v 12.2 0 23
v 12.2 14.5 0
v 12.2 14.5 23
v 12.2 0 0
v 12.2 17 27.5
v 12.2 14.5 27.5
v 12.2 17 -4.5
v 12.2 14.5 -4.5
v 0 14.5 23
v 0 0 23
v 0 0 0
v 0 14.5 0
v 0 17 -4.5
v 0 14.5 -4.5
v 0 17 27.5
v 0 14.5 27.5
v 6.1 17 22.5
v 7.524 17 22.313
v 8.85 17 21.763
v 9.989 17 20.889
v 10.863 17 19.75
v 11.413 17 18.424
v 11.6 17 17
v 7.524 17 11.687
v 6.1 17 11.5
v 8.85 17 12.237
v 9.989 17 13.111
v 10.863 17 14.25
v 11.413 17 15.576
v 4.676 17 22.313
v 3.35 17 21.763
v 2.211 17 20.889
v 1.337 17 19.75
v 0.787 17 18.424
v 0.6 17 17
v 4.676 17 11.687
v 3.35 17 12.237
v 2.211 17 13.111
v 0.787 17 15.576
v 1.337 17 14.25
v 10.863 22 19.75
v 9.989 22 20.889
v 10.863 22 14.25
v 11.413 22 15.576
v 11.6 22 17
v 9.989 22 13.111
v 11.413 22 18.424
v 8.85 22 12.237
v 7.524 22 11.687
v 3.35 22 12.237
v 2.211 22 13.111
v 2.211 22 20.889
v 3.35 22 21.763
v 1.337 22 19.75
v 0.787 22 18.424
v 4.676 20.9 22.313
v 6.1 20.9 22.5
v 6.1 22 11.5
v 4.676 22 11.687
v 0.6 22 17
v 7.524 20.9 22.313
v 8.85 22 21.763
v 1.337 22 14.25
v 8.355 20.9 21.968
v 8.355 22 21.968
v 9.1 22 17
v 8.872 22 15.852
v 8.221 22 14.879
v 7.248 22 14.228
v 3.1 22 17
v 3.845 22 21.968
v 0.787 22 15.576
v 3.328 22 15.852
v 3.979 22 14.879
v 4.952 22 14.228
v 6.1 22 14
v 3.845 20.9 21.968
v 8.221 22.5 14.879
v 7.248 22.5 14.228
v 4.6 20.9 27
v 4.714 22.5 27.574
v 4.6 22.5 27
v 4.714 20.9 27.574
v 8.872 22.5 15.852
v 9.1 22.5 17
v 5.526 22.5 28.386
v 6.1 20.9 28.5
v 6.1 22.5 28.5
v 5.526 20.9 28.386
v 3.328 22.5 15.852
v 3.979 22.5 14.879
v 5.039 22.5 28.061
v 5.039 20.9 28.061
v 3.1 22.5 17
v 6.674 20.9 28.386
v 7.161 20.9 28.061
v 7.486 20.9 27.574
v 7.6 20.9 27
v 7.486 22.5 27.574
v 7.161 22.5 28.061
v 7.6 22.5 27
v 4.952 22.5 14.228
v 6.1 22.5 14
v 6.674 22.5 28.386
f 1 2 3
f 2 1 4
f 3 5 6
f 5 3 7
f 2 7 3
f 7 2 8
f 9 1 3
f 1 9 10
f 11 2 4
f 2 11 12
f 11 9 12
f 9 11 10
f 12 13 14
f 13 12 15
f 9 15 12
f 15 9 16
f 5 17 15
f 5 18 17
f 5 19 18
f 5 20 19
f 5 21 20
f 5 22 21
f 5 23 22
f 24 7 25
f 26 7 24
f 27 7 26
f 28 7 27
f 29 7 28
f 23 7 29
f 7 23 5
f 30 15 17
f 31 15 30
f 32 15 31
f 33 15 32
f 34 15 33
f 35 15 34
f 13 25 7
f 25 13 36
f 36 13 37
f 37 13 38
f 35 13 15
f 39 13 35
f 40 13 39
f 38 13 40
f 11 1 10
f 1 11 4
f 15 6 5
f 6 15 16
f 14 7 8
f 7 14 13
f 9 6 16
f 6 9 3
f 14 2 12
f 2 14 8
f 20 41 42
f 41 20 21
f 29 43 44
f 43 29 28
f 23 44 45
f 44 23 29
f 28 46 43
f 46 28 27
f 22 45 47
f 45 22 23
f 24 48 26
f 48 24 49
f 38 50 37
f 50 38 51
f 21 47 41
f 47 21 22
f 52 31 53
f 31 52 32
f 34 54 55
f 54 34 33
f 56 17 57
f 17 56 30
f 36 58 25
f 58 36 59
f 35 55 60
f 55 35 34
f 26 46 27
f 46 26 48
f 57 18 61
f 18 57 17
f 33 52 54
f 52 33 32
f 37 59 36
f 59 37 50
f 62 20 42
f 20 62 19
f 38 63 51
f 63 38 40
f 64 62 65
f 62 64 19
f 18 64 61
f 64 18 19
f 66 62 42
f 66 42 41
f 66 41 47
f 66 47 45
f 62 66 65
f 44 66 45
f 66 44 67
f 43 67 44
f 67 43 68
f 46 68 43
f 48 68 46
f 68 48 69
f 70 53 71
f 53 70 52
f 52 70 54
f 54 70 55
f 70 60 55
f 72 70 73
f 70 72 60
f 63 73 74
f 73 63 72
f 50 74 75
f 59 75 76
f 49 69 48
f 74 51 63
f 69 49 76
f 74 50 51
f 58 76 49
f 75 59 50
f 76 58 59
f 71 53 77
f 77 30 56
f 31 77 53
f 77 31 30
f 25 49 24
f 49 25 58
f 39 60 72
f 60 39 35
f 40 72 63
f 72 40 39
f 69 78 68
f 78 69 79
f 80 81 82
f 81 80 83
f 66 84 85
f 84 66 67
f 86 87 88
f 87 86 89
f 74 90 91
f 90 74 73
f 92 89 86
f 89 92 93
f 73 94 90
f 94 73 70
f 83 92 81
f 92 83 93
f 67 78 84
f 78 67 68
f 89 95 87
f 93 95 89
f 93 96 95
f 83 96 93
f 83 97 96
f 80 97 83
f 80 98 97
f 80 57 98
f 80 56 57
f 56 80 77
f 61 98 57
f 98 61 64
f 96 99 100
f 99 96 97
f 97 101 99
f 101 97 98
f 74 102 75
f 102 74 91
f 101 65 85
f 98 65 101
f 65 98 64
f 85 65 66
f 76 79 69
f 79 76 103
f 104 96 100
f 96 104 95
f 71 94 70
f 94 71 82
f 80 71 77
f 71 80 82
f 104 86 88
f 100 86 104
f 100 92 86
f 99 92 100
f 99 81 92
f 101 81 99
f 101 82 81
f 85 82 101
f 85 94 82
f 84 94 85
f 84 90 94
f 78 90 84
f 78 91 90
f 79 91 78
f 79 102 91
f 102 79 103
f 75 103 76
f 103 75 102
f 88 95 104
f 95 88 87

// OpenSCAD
// file: design_params.scad
// ============================================================
// STARLING SHARED DESIGN PARAMETERS — single source of truth for
// every dimension two parts must agree on.
//
// Consumers:
//   - every part in cad/ does        include <design_params.scad>
//   - parts in cad/calibration/ do   include <../design_params.scad>
//   - scripts/check_params.py FAILS the build if any of these names
//     is re-declared anywhere else — change values HERE only.
//
// Keep this file to simple `name = value;` lines so the tooling can
// parse it. One-off experiments: `openscad -D name=value` beats the
// include, no need to edit this file.
// ============================================================

// --- The paper tube (bought part, consumable) ---
tube_od     = 52.95;   // measured tube OD — verify with cad/calibration/tube_fit_ring.scad
tube_wall   = 3;       // paper wall thickness (measure your tube)
tube_length = 540;

// --- Printed-part fits ---
sleeve_clearance = 0;  // added to every sleeve bore diameter; tune via the fit ring
fit_tol          = 0.2; // clearance for printed slots/pockets
sleeve_wall      = 3;  // wall thickness of printed sleeves

// --- Wing spar chain (rib holes = adapter sockets = carbon rods) ---
spar_rod_d    = 6;     // carbon rod diameter
spar_hole_d   = 6.2;   // printed hole for that rod
spar_spacing  = 20;    // chordwise distance between the two spars
spar_y_offset = 1.5;   // spar line sits this far above the rib chord line

// --- Wing geometry ---
rib_chord     = 100;
naca_code     = 2415;  // cambered lifting section
rib_thickness = 2;

// --- Wing adapter <-> root rib interface ---
wing_tab_thickness = 11; // adapter tab; the root-rib window = this + fit_tol
wing_tab_span      = 15; // how far the tab reaches out from the sleeve
adapter_length     = 40; // sleeve length = tab chord extent

// --- Stations along the tube (assembly; wing slides for CG trim) ---
wing_station       = 300; // wing adapter position, measured from the motor face
tail_tube_stop     = 54;  // tube bottoms out here inside the tail sleeve (rim top)
nose_sleeve_length = 20;  // how far the nose cone slides over the tube

// --- Servos (9 g / SG90 class) ---
servo_body   = [23, 12.2]; // [length, width]
servo_flange = [32, 12.2];
servo_height = 22;         // body height incl. shaft boss, without horn

// --- Control system (internal servos, wire pushrods through wall slots) ---
ctrl_chord       = 22;   // control-surface chord (elevator / rudder / aileron)
ctrl_thickness   = 4;    // control-surface root thickness = fin thickness
hinge_groove_w   = 1.6;  // groove for the hinge strip/tape, both fin TE and surface LE
hinge_groove_d   = 2.5;
pushrod_d        = 1.2;  // piano-wire pushrod, attached at the TIP of both arms
pushrod_slot_w   = 2.5;  // wall slot the pushrod moves in
pushrod_slot_len = 18;   // slot channel length along the rod (see throw_check.py)
servo_horn_r     = 10;   // full arm length — the wire connects at the far end
servo_travel_deg = 45;   // used one-sided travel; the arm can do ~±90 (180 total)
                         // but the linkage stays near-linear only within ±45
ctrl_horn_r      = 10;   // control-surface horn = servo horn -> 1:1 linkage

// Tail linkage geometry: servos sit HIGH in the tail sleeve and the wire
// rakes down/outboard through an ANGLED wall slot to the surface horn.
tail_servo_z    = 30;    // aft (shaft) end of the tail servo bodies
tail_slot_angle = 42;    // rod angle off the fuselage axis, in the radial plane

// --- Motor (22xx class, rear pusher) ---
motor_shaft_hole_d = 10;
motor_screw_hole_d = 4;
motor_pattern_x    = 16;  // screw pattern
motor_pattern_y    = 19;
// main file
// PLACEHOLDER MODELS of bought parts — a 9 g (SG90-class) servo and a
// piano-wire pushrod. Visual stand-ins for assembly/fit checks only;
// regen_all.py exports no STL for this file.
//
// servo_9g() local frame: body length along Z, width along Y, mounted face
// down at x=0 growing +X (radial when placed against the tube wall from
// inside); output shaft axis along Y ("side-lying" mount) so the horn
// swings in the X-Z plane — pushrod travel along Z.

include <design_params.scad>

module servo_9g(horn_angle = 0) {
    body_l = servo_body[0];
    body_w = servo_body[1];

    color("DarkSlateGray") {
        // Body (lying on its side: height along Y)
        cube([body_w, servo_height - 5, body_l]);
        // Mounting flange (perpendicular to the shaft, near the top)
        translate([0, servo_height - 7.5, -(servo_flange[0] - body_l) / 2])
            cube([body_w, 2.5, servo_flange[0]]);
        // Shaft boss + shaft (axis along Y)
        translate([body_w / 2, servo_height - 5, body_l - 6])
            rotate([-90, 0, 0])
                cylinder(h = 5, d = 11, $fn = 24);
    }
    // Full-length arm (the wire connects at its far end)
    color("White")
        translate([body_w / 2, servo_height + 0.5, body_l - 6])
            rotate([90, 0, 0])
                rotate([0, 0, horn_angle])
                    hull() {
                        cylinder(h = 1.6, d = 6, $fn = 16);
                        translate([0, servo_horn_r, 0])
                            cylinder(h = 1.6, d = 3, $fn = 16);
                    }
}

// Straight pushrod between two points (visual)
module pushrod(from, to) {
    color("Silver")
        hull() {
            translate(from) sphere(d = pushrod_d, $fn = 12);
            translate(to)   sphere(d = pushrod_d, $fn = 12);
        }
}

servo_9g();
